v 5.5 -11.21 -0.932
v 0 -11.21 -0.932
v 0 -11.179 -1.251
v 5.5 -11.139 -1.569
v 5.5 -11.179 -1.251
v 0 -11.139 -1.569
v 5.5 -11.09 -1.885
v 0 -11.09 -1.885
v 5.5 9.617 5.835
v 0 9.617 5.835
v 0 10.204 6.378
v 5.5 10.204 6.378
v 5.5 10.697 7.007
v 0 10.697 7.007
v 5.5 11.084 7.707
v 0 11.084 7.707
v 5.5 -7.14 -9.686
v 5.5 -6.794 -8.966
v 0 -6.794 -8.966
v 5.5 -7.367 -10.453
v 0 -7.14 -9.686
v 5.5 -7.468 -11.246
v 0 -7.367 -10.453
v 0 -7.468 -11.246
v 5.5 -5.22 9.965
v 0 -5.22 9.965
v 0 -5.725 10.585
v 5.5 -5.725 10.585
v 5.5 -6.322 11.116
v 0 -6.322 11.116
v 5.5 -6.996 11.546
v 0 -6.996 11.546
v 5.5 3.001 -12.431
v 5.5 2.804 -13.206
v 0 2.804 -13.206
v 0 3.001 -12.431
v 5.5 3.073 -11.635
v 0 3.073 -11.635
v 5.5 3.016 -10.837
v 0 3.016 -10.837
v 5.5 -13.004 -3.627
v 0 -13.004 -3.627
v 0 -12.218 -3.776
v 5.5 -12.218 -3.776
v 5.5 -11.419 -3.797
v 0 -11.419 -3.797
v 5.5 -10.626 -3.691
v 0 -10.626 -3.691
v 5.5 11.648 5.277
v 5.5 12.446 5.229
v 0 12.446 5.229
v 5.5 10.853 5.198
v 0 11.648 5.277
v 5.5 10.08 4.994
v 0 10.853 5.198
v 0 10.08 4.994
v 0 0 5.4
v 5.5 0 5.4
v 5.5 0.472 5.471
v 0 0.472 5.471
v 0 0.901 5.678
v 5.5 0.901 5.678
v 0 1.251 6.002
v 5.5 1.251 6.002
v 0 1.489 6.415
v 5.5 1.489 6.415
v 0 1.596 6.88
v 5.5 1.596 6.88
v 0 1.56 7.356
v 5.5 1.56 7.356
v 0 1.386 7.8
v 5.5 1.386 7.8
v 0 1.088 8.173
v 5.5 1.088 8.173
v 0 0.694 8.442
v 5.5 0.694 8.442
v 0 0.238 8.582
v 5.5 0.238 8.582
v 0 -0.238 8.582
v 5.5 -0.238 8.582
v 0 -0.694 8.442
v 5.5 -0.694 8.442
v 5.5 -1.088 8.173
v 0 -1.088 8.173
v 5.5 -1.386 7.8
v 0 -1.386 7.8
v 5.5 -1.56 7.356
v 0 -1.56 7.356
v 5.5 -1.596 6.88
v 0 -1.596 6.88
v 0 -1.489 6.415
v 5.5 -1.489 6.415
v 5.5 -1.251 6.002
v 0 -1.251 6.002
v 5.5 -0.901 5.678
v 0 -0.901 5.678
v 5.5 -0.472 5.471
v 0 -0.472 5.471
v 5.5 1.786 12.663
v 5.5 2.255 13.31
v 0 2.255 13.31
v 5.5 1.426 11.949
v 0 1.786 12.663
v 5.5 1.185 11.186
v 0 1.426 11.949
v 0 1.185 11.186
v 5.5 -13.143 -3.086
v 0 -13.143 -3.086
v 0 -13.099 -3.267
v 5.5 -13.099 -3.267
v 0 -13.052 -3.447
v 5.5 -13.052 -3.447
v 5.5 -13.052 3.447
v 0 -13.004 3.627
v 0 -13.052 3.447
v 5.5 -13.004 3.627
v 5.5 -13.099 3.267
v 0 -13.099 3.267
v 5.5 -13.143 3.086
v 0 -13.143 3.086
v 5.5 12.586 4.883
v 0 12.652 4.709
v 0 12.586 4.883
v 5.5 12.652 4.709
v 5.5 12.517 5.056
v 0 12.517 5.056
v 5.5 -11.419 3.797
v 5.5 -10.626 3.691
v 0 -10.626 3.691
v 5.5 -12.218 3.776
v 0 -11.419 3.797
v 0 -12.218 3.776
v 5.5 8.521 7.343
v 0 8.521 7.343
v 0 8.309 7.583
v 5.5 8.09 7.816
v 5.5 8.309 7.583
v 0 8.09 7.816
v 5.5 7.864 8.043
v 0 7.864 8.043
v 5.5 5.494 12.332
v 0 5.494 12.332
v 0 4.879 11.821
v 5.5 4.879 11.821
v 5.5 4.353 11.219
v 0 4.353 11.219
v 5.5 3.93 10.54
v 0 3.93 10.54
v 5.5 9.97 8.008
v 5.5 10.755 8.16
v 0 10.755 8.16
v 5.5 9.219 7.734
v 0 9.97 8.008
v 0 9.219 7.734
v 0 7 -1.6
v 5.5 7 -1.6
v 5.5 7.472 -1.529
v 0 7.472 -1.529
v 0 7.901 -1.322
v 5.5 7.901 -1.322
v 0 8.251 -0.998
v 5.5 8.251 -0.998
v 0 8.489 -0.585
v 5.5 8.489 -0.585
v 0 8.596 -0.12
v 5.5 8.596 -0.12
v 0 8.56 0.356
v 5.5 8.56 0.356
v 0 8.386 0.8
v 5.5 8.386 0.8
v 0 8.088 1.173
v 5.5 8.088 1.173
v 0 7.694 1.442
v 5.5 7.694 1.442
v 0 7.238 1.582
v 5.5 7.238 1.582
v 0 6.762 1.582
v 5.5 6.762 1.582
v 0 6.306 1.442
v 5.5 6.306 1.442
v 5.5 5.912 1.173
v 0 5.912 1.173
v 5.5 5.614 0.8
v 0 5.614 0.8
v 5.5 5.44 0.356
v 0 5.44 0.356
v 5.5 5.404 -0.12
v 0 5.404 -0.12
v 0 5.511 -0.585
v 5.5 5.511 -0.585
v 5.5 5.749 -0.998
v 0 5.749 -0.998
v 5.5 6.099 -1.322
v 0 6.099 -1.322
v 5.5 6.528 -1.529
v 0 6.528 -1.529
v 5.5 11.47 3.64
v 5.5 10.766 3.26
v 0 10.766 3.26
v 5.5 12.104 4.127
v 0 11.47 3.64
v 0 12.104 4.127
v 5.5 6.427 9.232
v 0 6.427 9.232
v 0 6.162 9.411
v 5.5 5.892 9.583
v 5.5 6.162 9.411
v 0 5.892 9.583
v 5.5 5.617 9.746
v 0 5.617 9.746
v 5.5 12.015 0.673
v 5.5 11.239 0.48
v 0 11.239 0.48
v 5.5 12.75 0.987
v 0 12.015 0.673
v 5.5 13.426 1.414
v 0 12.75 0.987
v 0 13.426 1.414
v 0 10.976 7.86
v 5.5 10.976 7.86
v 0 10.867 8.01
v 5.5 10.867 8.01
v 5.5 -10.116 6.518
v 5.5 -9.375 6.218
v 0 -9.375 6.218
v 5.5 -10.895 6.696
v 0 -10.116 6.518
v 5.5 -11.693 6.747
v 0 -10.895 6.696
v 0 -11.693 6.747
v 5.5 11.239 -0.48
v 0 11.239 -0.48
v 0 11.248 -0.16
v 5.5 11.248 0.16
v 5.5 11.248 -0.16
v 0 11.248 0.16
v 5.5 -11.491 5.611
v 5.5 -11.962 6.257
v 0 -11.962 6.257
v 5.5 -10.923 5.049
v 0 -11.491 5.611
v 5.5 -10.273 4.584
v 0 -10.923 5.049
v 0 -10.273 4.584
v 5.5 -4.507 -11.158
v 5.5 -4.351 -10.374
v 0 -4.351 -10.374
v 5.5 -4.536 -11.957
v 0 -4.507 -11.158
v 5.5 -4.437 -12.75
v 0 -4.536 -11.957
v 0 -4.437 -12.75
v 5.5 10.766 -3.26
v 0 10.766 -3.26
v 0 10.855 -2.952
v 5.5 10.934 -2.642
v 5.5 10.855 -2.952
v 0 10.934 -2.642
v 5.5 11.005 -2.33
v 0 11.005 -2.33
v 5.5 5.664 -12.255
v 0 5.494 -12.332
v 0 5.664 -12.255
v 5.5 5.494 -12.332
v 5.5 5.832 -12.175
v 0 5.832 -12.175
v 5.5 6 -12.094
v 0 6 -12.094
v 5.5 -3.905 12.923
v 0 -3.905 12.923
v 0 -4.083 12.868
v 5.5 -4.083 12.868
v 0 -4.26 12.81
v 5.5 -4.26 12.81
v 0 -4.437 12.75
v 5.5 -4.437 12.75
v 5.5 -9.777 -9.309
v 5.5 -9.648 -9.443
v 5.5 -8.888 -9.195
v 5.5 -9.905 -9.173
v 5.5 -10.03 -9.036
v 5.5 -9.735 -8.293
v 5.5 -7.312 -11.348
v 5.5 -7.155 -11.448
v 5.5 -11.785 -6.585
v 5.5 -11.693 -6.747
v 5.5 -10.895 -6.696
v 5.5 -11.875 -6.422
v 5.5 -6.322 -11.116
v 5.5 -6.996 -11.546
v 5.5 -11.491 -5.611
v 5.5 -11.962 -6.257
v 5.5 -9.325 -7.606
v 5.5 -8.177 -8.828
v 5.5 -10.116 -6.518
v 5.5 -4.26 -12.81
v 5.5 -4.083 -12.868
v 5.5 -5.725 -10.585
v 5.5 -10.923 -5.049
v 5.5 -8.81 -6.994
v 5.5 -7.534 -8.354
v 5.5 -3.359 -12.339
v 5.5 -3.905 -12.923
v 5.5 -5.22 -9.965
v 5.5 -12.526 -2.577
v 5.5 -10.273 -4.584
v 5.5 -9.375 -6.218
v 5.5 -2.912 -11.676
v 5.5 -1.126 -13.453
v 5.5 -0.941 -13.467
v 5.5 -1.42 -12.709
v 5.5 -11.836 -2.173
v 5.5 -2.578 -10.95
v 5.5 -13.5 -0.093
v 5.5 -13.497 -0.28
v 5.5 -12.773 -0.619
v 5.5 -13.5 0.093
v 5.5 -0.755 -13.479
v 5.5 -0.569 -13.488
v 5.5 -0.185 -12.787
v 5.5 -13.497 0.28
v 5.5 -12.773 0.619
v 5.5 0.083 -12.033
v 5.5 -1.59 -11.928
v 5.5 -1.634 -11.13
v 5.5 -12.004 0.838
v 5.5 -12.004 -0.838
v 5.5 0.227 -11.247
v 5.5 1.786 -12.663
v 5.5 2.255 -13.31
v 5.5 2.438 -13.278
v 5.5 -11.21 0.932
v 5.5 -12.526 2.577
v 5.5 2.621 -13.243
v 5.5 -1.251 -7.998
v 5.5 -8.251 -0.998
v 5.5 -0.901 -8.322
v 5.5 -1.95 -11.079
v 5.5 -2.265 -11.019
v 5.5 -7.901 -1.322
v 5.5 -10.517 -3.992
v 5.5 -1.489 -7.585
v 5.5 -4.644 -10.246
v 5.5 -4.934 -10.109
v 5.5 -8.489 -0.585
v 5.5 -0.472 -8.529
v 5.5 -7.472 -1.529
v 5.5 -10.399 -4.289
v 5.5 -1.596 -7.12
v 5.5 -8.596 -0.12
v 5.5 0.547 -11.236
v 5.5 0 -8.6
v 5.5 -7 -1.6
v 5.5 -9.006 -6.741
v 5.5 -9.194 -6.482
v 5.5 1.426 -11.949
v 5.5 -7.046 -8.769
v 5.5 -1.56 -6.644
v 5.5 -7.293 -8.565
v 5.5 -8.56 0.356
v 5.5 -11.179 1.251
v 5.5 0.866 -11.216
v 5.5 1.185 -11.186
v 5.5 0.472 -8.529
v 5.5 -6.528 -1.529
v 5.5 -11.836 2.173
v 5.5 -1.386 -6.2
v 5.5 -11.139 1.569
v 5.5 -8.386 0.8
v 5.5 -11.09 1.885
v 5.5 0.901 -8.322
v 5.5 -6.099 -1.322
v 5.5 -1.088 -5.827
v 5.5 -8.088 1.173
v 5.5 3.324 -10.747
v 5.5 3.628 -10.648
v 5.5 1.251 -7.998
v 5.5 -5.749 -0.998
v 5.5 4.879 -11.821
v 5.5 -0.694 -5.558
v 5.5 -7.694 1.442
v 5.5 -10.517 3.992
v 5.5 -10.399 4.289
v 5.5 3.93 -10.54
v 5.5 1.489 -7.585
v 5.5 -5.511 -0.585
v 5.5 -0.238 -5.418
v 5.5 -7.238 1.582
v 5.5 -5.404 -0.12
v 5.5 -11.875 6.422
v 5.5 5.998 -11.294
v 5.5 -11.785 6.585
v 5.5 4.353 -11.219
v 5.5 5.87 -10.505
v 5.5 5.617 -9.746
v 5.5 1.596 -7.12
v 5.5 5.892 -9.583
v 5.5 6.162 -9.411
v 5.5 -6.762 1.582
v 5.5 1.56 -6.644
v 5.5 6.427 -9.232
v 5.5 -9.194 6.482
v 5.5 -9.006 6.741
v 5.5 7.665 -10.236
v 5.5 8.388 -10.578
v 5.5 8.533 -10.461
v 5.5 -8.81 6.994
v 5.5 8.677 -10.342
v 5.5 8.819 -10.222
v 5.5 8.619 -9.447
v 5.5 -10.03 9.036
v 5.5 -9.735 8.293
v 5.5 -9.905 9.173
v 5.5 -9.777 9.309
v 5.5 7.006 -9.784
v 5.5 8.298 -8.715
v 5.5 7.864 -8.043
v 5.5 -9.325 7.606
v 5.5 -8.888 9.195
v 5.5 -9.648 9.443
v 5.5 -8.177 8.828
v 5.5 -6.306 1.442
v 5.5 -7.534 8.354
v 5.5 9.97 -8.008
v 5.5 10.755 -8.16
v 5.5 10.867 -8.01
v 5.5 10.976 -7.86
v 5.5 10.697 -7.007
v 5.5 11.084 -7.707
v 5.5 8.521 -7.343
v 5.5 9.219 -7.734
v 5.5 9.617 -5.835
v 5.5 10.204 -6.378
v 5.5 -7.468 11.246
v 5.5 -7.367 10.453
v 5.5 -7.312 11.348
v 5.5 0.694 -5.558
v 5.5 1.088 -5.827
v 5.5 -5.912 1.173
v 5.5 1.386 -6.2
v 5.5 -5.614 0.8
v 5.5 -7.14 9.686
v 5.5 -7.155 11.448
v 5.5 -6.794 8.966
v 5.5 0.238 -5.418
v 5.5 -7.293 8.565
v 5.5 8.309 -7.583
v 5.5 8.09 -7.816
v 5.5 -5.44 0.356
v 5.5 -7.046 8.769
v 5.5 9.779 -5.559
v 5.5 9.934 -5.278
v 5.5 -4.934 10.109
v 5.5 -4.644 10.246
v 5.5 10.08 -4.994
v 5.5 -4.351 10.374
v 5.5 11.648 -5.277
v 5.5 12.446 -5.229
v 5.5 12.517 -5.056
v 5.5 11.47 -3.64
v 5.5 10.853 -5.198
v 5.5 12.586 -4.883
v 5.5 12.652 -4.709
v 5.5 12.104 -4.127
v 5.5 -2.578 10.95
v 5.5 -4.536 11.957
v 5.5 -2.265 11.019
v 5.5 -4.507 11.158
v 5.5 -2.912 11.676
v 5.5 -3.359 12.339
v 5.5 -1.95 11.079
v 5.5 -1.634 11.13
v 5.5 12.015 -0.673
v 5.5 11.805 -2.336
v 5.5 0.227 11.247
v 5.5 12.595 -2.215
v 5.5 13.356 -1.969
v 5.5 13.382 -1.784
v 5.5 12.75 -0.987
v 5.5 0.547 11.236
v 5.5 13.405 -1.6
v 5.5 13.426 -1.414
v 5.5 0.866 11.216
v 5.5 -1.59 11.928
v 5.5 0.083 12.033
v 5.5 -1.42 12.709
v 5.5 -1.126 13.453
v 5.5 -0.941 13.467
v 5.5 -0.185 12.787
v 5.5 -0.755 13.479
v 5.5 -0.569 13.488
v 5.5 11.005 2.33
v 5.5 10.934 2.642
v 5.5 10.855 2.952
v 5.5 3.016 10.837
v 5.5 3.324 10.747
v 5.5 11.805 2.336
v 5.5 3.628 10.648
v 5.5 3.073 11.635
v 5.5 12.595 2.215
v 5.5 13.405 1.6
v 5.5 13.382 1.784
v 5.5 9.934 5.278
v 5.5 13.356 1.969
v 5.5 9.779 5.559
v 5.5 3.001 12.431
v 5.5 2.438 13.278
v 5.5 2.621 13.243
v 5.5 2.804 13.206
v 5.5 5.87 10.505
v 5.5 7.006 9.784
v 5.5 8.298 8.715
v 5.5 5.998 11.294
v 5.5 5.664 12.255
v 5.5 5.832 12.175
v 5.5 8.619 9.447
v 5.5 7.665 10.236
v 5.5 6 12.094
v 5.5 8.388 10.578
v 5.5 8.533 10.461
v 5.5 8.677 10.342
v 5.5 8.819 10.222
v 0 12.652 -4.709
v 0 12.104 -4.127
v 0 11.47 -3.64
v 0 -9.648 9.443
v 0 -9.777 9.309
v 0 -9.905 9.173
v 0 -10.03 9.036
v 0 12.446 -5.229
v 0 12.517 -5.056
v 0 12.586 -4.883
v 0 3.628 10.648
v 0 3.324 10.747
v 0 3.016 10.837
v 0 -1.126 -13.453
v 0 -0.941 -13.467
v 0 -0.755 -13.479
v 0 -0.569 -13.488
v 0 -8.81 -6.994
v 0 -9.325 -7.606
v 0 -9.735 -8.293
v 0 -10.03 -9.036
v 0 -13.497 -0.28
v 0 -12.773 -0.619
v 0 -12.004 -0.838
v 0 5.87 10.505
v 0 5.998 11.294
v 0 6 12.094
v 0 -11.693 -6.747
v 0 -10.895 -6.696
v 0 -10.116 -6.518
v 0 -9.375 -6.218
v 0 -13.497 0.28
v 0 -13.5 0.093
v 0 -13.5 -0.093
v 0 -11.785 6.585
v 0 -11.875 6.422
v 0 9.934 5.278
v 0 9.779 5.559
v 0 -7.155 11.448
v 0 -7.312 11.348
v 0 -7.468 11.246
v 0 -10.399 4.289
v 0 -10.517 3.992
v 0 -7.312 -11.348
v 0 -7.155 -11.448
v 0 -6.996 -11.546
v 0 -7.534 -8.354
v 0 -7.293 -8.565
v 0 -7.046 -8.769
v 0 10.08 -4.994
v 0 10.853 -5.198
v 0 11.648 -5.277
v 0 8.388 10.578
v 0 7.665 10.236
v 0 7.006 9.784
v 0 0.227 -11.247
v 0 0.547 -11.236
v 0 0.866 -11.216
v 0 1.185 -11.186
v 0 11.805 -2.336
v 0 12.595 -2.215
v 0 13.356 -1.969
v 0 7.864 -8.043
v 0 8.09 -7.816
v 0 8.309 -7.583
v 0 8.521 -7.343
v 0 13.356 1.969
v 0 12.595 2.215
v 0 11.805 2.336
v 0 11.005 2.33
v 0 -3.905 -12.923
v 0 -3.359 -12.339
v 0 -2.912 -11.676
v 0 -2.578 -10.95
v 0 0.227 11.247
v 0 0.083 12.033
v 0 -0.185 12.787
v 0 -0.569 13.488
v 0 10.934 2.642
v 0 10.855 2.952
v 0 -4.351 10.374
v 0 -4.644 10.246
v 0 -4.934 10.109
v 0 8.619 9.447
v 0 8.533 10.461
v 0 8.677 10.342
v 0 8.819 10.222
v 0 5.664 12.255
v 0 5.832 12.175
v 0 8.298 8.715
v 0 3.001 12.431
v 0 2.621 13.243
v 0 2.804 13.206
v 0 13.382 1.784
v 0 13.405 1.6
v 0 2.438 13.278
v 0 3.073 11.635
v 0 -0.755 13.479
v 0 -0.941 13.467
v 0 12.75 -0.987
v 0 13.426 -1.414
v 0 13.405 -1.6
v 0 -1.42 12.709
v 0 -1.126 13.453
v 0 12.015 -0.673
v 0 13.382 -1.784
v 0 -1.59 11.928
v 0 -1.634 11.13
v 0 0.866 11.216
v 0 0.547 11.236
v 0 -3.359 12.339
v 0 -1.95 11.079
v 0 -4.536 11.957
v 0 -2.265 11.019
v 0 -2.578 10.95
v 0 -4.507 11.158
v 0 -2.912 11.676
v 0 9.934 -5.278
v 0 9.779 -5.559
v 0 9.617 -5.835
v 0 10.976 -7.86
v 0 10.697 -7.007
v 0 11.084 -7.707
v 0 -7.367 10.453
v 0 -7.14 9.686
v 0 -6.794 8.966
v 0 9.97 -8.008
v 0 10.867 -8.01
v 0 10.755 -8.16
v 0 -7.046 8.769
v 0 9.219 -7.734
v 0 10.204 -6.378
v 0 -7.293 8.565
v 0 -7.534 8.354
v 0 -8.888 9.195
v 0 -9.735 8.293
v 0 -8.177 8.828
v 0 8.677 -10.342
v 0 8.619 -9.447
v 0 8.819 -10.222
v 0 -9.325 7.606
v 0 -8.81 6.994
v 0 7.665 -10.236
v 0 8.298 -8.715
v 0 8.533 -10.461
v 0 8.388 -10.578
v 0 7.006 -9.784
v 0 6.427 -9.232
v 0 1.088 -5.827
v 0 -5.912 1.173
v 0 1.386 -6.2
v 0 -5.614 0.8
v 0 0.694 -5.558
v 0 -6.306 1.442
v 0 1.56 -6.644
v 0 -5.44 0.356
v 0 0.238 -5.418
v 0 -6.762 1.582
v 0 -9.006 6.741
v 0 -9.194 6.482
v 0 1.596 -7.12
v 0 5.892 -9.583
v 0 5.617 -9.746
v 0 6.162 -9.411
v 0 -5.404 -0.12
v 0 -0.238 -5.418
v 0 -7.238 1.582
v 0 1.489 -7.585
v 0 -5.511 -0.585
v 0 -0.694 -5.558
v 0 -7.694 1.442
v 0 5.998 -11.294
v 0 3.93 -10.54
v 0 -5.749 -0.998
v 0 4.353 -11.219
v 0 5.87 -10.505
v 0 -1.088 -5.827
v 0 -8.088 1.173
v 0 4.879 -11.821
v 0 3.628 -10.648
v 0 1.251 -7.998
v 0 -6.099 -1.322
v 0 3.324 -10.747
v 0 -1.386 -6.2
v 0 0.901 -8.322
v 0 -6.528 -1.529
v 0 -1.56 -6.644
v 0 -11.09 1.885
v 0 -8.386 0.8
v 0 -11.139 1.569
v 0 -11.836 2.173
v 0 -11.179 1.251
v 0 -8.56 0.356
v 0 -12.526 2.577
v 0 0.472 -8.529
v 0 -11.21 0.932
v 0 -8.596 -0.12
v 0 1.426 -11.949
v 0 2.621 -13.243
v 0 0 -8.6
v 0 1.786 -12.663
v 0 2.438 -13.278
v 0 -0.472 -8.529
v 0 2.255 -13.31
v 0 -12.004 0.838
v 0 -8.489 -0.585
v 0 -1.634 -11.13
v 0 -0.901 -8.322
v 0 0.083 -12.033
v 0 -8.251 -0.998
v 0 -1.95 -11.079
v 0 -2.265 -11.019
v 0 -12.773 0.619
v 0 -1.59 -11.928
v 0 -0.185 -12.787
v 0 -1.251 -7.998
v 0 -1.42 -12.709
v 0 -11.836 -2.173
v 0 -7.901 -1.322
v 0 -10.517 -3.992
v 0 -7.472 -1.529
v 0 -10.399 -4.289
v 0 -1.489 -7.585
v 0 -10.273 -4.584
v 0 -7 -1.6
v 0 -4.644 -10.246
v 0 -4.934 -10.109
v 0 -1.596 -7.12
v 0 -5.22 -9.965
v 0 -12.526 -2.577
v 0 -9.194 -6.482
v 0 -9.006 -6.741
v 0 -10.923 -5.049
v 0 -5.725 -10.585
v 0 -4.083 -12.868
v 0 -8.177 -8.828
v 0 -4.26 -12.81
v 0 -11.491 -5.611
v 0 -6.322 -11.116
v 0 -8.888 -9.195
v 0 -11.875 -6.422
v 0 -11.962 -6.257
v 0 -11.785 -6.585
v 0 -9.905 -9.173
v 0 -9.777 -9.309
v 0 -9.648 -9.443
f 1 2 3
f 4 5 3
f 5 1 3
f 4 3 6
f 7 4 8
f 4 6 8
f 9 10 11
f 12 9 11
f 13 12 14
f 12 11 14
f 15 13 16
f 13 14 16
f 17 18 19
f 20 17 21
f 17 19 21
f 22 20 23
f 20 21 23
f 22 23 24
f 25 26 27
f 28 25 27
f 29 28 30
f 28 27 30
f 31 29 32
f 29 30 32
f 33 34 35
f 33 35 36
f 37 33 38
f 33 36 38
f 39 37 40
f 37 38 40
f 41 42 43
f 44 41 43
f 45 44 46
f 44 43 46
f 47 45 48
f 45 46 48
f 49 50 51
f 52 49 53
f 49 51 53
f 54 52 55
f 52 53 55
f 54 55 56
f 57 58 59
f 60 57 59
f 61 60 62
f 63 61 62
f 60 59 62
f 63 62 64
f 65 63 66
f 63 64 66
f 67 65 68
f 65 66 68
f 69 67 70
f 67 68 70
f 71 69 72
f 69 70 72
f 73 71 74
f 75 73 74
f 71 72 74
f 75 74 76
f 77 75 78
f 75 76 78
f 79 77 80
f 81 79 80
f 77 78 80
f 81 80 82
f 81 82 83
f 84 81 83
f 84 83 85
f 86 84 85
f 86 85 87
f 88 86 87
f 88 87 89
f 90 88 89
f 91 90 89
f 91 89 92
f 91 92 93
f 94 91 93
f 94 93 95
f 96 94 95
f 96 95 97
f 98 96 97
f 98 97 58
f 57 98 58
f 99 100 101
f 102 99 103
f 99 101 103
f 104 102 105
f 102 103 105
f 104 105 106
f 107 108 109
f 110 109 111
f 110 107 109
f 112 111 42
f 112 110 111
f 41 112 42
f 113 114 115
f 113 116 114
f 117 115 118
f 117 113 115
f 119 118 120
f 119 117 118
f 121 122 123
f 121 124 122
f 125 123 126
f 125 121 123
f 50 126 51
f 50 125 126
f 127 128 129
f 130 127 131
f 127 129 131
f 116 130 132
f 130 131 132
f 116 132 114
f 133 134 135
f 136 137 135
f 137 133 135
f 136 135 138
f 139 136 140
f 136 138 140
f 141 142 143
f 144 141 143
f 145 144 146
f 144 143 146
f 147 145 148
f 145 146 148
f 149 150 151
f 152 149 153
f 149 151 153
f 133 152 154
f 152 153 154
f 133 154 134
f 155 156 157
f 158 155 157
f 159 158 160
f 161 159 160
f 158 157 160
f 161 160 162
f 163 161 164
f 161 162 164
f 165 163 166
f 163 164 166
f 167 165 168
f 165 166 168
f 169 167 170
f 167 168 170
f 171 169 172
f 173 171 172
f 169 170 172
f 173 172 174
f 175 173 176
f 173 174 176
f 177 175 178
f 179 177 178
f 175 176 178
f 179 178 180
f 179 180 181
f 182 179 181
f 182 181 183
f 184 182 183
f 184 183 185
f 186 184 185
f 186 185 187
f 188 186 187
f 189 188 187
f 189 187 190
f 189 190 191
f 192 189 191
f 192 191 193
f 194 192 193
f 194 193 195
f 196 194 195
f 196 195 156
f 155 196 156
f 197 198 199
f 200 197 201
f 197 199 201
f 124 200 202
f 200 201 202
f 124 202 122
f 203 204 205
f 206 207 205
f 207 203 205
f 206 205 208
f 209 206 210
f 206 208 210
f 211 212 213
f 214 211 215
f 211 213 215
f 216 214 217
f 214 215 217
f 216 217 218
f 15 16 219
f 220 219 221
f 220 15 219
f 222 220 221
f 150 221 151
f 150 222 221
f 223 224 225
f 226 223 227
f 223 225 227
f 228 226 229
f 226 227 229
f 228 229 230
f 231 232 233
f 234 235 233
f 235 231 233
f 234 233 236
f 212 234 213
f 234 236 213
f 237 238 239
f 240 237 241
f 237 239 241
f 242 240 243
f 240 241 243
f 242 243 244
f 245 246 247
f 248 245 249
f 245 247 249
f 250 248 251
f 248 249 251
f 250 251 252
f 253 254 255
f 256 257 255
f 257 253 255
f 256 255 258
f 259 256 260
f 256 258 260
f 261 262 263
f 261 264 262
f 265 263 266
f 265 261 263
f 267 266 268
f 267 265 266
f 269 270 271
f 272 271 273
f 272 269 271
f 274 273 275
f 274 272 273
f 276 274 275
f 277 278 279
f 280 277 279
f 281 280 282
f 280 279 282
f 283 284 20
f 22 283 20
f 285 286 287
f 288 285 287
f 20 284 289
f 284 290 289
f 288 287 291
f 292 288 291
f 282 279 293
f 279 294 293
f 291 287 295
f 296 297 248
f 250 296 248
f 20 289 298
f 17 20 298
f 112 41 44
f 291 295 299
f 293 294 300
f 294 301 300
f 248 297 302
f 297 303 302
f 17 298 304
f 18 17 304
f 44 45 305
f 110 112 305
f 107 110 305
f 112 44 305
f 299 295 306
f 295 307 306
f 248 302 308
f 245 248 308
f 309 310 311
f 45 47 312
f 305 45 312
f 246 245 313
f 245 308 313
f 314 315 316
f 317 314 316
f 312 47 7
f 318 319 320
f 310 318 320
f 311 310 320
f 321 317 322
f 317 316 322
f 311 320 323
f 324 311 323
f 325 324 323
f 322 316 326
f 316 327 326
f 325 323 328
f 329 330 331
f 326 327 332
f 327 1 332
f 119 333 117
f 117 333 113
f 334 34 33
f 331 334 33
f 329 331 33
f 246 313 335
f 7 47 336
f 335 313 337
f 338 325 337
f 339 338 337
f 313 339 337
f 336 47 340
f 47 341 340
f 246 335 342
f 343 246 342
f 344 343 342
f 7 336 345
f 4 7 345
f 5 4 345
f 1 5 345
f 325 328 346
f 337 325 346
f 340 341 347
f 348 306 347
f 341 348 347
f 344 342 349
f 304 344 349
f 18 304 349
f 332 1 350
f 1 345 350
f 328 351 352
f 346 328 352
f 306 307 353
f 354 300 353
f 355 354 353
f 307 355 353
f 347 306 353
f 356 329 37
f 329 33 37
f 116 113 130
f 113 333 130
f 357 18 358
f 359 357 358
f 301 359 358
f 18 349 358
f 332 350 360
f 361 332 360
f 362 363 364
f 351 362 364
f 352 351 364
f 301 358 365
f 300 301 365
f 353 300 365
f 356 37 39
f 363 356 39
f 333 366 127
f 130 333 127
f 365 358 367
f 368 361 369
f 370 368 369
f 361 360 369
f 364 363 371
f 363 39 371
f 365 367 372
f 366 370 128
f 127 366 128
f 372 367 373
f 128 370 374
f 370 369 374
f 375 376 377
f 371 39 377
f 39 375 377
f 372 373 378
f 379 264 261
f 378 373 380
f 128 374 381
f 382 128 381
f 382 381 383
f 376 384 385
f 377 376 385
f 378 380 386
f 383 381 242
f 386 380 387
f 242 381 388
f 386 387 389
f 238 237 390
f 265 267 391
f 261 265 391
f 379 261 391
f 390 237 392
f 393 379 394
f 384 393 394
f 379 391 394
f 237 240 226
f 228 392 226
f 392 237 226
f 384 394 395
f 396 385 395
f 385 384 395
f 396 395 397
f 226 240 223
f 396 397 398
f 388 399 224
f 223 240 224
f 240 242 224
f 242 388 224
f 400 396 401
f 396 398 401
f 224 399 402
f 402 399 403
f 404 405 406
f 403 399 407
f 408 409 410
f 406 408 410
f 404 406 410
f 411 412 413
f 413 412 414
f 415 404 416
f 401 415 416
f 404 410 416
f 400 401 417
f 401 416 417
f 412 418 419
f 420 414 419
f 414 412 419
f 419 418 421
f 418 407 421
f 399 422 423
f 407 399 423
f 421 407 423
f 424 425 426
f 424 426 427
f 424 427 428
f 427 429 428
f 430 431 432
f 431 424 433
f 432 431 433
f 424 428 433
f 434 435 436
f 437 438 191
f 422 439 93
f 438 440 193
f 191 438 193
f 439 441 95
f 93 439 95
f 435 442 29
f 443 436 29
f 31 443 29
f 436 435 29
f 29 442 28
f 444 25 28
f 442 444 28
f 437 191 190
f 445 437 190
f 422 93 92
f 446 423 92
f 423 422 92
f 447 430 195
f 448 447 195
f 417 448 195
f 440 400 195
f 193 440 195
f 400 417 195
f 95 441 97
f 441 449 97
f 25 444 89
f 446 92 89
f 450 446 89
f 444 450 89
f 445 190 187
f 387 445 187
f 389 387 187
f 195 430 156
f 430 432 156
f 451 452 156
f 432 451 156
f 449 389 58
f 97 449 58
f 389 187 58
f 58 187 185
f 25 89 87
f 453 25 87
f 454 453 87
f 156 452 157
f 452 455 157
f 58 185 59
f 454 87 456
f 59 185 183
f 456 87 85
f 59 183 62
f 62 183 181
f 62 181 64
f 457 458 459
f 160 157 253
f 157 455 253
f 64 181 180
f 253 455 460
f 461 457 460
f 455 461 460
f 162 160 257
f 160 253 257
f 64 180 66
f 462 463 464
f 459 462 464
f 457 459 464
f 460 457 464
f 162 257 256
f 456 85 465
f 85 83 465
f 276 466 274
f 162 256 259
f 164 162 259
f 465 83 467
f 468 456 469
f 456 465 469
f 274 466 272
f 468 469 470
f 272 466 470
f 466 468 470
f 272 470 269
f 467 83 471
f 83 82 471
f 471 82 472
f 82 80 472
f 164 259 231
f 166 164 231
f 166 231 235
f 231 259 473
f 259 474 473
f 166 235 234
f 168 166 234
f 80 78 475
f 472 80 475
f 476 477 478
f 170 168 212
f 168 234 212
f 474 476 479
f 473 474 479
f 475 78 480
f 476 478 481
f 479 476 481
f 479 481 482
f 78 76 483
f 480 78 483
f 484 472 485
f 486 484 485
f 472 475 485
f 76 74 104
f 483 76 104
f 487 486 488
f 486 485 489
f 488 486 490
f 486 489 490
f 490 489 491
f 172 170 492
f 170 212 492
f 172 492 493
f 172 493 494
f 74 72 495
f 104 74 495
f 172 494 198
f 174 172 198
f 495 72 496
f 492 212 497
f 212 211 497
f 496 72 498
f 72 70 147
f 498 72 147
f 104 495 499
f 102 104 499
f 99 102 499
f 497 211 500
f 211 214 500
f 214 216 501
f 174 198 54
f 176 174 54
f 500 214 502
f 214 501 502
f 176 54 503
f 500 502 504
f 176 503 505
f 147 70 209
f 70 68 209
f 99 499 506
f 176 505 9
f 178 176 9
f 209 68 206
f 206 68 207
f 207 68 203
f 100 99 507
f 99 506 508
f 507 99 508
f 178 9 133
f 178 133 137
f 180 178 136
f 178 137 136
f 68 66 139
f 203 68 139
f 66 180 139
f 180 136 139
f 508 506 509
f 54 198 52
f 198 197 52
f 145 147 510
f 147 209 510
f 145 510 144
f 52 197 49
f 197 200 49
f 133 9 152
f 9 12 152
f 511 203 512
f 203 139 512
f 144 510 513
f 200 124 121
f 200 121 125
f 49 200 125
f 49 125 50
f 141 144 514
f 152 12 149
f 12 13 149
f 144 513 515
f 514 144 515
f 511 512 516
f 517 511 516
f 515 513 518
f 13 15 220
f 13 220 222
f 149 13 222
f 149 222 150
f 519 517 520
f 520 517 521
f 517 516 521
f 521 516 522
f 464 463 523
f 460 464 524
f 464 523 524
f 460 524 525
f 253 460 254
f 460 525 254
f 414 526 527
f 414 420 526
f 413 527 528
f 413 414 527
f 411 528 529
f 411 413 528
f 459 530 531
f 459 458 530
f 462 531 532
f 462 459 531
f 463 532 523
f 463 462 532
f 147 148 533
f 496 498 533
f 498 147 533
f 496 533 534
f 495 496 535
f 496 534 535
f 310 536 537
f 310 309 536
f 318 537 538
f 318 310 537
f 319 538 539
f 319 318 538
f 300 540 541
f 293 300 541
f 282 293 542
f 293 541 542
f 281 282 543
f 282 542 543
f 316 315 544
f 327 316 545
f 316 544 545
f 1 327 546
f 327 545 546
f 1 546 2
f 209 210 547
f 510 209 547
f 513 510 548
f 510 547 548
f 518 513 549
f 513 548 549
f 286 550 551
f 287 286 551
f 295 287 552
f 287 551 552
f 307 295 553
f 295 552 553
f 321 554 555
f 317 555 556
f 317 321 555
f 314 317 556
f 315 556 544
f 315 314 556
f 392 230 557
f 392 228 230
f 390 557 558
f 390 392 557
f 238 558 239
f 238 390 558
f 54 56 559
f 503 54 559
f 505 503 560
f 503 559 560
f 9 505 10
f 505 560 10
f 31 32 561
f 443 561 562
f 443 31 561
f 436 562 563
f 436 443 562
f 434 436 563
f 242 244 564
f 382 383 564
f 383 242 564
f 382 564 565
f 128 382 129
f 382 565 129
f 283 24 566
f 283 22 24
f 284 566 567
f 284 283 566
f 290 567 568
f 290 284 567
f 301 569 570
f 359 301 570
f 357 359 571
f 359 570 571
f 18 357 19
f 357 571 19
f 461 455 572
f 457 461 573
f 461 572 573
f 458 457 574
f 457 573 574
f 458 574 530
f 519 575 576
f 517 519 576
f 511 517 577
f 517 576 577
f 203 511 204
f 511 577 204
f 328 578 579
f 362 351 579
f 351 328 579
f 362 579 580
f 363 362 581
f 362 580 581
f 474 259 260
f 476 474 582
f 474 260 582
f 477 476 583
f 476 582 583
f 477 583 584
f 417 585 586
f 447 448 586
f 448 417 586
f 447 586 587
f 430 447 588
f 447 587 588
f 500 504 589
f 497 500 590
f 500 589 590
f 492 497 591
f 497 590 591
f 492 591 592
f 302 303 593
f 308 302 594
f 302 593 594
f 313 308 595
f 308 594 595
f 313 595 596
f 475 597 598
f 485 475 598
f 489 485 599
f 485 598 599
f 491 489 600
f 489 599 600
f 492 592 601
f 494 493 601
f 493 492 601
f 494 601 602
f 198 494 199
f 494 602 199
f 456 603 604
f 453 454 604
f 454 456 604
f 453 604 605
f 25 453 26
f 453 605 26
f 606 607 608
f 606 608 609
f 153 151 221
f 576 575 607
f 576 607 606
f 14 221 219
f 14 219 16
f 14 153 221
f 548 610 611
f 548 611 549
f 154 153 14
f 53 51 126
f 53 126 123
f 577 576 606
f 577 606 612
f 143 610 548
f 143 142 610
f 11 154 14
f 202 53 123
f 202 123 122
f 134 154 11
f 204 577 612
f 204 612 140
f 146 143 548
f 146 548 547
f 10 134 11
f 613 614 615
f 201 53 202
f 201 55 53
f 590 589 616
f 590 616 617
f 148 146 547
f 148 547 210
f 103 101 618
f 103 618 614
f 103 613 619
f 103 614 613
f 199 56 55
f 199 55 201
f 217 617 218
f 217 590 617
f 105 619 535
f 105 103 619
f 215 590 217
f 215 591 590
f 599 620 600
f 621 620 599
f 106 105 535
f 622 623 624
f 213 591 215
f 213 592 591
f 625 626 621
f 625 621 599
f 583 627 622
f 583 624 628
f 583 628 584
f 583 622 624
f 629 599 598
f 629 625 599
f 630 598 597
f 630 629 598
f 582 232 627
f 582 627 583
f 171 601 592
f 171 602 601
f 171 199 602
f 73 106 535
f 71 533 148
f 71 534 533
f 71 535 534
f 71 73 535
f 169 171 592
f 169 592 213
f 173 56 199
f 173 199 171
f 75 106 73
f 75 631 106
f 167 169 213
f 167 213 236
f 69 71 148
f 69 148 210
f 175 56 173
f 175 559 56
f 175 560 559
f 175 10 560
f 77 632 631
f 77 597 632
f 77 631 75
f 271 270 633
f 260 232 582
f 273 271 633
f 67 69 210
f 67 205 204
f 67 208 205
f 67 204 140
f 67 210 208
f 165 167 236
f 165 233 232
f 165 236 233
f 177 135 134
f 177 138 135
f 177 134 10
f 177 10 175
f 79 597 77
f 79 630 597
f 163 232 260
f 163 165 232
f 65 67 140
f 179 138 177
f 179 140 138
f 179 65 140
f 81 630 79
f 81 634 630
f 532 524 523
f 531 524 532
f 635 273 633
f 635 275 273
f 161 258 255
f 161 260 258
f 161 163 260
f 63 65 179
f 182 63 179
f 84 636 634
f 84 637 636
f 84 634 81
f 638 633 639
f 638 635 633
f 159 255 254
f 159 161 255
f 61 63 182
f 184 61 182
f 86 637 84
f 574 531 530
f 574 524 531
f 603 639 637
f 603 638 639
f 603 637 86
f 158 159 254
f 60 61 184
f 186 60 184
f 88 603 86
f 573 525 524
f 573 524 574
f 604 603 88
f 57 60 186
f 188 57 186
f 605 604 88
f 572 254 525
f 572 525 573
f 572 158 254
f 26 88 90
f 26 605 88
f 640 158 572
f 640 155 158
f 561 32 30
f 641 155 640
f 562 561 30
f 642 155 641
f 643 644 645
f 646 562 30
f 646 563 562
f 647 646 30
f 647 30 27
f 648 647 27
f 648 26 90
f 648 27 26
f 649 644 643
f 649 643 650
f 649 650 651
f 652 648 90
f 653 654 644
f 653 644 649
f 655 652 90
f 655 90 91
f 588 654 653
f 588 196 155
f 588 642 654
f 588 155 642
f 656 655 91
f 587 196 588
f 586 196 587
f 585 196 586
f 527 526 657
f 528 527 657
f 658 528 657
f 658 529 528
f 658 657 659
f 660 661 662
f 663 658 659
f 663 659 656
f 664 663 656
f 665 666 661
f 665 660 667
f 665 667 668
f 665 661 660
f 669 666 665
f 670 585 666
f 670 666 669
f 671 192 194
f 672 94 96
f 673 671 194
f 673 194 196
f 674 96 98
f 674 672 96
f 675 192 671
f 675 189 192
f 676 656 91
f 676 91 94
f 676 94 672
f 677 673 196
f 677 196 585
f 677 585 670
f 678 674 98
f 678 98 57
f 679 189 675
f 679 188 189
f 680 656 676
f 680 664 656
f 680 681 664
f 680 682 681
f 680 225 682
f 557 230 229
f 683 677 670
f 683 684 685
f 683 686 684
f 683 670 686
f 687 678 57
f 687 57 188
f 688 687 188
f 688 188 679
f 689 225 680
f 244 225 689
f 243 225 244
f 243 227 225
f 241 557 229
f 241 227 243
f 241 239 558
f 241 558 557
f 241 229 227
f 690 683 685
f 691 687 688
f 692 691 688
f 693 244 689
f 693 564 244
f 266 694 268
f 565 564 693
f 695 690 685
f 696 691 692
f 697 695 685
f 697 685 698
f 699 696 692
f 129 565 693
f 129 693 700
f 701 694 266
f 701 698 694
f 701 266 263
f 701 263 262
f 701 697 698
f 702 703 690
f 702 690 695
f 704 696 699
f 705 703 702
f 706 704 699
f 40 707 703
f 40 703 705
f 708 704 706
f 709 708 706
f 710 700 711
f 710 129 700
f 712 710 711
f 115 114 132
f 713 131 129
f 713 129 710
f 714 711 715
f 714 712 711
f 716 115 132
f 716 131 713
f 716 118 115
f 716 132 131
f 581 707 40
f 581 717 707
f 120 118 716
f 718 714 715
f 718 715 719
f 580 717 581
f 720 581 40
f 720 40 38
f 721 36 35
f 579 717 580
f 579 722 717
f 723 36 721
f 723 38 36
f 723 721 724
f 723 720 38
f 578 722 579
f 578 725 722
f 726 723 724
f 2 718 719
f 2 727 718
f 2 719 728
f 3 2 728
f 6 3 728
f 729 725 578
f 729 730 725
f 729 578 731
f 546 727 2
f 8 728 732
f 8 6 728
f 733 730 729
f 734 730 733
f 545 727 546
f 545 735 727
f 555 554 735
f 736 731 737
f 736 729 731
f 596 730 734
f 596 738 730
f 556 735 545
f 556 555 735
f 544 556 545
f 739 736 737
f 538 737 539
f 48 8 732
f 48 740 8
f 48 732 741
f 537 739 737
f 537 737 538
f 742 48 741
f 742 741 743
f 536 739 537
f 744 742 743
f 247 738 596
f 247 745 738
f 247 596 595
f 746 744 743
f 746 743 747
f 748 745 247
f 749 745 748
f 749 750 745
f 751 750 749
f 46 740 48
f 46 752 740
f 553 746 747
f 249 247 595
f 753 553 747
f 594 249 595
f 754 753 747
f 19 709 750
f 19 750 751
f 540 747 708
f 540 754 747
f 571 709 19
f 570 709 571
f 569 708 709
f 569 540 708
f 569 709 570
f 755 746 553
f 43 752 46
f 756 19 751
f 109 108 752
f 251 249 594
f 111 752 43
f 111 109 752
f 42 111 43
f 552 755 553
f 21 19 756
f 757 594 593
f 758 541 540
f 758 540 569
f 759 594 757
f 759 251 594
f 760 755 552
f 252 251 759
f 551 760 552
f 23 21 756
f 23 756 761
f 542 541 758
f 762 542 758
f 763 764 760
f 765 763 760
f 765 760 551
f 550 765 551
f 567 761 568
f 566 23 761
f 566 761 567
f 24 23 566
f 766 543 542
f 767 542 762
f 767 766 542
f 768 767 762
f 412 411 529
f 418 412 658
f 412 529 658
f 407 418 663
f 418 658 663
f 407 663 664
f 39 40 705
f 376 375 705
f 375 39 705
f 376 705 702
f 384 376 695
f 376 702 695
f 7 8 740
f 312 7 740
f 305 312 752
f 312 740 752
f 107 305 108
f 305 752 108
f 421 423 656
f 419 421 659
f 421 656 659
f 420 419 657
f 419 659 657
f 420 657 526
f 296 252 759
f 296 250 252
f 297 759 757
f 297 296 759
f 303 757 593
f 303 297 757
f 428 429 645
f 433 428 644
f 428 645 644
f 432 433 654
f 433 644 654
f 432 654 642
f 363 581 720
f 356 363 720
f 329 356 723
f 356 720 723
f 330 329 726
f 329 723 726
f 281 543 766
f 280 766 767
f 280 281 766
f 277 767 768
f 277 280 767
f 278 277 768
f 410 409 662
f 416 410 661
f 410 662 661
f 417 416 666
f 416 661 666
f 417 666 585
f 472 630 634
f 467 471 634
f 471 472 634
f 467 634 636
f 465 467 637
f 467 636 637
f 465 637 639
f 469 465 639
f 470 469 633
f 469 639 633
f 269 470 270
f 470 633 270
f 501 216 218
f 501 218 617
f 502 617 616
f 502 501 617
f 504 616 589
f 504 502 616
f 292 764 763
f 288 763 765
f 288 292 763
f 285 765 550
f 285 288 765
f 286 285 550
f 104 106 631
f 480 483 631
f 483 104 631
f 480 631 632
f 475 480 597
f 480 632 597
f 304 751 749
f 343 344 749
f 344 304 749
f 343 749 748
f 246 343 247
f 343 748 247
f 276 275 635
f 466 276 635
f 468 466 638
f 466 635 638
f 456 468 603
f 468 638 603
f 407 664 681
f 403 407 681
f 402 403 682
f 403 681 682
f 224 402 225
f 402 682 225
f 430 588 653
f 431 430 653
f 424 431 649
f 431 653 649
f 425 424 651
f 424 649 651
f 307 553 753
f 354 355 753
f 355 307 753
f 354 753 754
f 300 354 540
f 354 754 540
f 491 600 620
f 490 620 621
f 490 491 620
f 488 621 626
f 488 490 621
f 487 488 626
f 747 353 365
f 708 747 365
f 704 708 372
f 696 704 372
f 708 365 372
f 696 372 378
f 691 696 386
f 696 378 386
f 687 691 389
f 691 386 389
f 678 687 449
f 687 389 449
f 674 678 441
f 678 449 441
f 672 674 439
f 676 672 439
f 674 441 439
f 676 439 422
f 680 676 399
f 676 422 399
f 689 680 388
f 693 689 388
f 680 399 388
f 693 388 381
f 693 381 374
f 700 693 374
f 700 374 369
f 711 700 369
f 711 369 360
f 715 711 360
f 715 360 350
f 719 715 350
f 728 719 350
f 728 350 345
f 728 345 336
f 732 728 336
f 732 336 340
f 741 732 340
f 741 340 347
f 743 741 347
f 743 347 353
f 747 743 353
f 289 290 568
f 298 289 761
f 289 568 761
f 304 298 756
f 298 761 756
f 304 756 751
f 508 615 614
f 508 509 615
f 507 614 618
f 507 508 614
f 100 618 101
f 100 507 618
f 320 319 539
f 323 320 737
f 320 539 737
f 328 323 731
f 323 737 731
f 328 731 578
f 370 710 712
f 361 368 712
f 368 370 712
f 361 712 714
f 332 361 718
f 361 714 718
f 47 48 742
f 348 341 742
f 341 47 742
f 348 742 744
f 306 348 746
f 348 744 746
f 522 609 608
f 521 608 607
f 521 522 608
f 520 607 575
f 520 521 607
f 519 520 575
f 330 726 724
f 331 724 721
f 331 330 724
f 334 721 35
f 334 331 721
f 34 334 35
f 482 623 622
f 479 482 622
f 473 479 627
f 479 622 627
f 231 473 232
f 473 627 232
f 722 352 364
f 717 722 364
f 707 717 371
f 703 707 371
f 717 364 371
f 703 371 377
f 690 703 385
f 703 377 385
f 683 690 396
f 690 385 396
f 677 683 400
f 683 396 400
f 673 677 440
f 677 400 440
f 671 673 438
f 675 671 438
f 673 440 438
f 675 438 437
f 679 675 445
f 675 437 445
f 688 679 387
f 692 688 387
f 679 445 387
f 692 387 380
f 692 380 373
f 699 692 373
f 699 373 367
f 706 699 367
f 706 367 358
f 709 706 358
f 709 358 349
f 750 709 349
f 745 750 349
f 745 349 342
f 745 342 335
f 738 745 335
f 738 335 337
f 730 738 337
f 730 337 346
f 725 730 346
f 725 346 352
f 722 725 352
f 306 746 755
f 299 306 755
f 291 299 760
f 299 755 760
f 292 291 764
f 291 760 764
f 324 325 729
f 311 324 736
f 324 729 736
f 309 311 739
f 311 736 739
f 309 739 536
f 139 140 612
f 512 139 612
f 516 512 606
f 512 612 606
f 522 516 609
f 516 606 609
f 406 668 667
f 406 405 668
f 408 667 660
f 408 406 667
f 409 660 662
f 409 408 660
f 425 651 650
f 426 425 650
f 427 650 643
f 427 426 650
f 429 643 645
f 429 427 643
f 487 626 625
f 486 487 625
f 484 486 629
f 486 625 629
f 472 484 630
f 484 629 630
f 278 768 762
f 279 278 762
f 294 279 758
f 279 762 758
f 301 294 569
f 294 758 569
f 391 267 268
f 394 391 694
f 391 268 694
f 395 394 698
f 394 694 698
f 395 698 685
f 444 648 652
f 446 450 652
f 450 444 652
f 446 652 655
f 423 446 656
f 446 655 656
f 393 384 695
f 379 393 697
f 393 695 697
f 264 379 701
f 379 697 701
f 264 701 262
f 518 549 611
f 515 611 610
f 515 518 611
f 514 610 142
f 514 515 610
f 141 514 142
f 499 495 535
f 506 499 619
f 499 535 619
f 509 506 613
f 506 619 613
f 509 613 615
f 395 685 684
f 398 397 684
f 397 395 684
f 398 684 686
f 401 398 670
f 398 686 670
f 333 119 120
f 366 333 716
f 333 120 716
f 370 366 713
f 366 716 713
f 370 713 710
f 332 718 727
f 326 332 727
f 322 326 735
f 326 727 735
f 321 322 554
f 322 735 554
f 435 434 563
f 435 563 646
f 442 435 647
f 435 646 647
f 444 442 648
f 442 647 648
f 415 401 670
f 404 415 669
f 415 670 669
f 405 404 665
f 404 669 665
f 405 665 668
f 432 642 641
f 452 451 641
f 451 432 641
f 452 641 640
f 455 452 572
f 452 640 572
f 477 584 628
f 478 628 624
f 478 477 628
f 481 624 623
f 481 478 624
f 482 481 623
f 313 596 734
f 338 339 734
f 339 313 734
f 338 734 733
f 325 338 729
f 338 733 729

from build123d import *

# Parameters (mm, degrees)
BASPROSKE_W         = 5.5
BASPROSKE_H         = 13.5
TOOTHCUT_DEPTH      = 20.868316486
TEETHCUTS_COUNT     = 25
TEETHCUTS_ANGLE     = 345.6
BORSKE_R            = 7
BORE_DEPTH          = 50.0000508
EXTRUDE_START       = -5.5
SKETCH_1_R          = 7
EXTRUDE_1_DEPTH     = 5.5
SKETCH_2_R          = 1.6
CUT_EXTRUDE_1_DEPTH = 20.860181149


with BuildPart() as part:
    # BasProSke → Base-Revolve (revolve)
    with BuildSketch(Plane(origin=(0, 0, 0), x_dir=(1, 0, 0), z_dir=(0, 1, 0)), mode=Mode.PRIVATE) as base_revolve_sk:
        with Locations((2.75, 6.75)):
            Rectangle(BASPROSKE_W, BASPROSKE_H)
    revolve(base_revolve_sk.sketch.rotate(Axis((-10, 0, 0), (1, 0, 0)), 180), axis=Axis((-10, 0, 0), (1, 0, 0)))

    # TooCutSke → ToothCut (cut, through all)
    with BuildSketch(Plane(origin=(0, 0, 0), x_dir=(0, 0, -1), z_dir=(1, 0, 0))):
        with BuildLine():
            ThreePointArc((0.480087995, 11.238750665), (0, 11.249), (-0.480087995, 11.238750665))
            ThreePointArc((-0.480087995, 11.238750665), (-0.821124963, 12.40220054), (-1.432168974, 13.449361962))
            ThreePointArc((-1.432168974, 13.449361962), (0, 13.5254), (1.432168974, 13.449361962))
            ThreePointArc((1.432168974, 13.449361962), (0.821124963, 12.40220054), (0.480087995, 11.238750665))
        make_face()
    toothcut = extrude(amount=TOOTHCUT_DEPTH, mode=Mode.SUBTRACT)

    # TeethCuts: ToothCut ×25 about axis
    teethcuts_axis = Axis((-10, 0, 0), (1, 0, 0))
    for i in range(1, TEETHCUTS_COUNT):
        add(toothcut.rotate(teethcuts_axis, i * TEETHCUTS_ANGLE / (TEETHCUTS_COUNT - 1)), mode=Mode.SUBTRACT)

    # BorSke → Bore (cut, symmetric)
    with BuildSketch(Plane(origin=(0, 0, 0), x_dir=(0, 0, -1), z_dir=(1, 0, 0))):
        with Locations(Location((0, 0, 0), (0, 0, 180))):
            Circle(BORSKE_R)
    extrude(amount=BORE_DEPTH, both=True, mode=Mode.SUBTRACT)

    # ｽｹｯﾁ1 → ﾎﾞｽ - 押し出し1 (add)
    with BuildSketch(Plane.ZY.offset(EXTRUDE_START)):
        Circle(SKETCH_1_R)
    extrude(amount=EXTRUDE_1_DEPTH)

    # ｽｹｯﾁ2 → ｶｯﾄ - 押し出し1 (cut, through all)
    with BuildSketch(Plane(origin=(5.5, 0, 0), x_dir=(0, 0, -1), z_dir=(1, 0, 0))):
        with Locations((0, 7)):
            Circle(SKETCH_2_R)
        with Locations((7, 0)):
            Circle(SKETCH_2_R)
        with Locations((0, -7)):
            Circle(SKETCH_2_R)
        with Locations((-7, 0)):
            Circle(SKETCH_2_R)
    extrude(amount=-CUT_EXTRUDE_1_DEPTH, mode=Mode.SUBTRACT)


solid = part.part
